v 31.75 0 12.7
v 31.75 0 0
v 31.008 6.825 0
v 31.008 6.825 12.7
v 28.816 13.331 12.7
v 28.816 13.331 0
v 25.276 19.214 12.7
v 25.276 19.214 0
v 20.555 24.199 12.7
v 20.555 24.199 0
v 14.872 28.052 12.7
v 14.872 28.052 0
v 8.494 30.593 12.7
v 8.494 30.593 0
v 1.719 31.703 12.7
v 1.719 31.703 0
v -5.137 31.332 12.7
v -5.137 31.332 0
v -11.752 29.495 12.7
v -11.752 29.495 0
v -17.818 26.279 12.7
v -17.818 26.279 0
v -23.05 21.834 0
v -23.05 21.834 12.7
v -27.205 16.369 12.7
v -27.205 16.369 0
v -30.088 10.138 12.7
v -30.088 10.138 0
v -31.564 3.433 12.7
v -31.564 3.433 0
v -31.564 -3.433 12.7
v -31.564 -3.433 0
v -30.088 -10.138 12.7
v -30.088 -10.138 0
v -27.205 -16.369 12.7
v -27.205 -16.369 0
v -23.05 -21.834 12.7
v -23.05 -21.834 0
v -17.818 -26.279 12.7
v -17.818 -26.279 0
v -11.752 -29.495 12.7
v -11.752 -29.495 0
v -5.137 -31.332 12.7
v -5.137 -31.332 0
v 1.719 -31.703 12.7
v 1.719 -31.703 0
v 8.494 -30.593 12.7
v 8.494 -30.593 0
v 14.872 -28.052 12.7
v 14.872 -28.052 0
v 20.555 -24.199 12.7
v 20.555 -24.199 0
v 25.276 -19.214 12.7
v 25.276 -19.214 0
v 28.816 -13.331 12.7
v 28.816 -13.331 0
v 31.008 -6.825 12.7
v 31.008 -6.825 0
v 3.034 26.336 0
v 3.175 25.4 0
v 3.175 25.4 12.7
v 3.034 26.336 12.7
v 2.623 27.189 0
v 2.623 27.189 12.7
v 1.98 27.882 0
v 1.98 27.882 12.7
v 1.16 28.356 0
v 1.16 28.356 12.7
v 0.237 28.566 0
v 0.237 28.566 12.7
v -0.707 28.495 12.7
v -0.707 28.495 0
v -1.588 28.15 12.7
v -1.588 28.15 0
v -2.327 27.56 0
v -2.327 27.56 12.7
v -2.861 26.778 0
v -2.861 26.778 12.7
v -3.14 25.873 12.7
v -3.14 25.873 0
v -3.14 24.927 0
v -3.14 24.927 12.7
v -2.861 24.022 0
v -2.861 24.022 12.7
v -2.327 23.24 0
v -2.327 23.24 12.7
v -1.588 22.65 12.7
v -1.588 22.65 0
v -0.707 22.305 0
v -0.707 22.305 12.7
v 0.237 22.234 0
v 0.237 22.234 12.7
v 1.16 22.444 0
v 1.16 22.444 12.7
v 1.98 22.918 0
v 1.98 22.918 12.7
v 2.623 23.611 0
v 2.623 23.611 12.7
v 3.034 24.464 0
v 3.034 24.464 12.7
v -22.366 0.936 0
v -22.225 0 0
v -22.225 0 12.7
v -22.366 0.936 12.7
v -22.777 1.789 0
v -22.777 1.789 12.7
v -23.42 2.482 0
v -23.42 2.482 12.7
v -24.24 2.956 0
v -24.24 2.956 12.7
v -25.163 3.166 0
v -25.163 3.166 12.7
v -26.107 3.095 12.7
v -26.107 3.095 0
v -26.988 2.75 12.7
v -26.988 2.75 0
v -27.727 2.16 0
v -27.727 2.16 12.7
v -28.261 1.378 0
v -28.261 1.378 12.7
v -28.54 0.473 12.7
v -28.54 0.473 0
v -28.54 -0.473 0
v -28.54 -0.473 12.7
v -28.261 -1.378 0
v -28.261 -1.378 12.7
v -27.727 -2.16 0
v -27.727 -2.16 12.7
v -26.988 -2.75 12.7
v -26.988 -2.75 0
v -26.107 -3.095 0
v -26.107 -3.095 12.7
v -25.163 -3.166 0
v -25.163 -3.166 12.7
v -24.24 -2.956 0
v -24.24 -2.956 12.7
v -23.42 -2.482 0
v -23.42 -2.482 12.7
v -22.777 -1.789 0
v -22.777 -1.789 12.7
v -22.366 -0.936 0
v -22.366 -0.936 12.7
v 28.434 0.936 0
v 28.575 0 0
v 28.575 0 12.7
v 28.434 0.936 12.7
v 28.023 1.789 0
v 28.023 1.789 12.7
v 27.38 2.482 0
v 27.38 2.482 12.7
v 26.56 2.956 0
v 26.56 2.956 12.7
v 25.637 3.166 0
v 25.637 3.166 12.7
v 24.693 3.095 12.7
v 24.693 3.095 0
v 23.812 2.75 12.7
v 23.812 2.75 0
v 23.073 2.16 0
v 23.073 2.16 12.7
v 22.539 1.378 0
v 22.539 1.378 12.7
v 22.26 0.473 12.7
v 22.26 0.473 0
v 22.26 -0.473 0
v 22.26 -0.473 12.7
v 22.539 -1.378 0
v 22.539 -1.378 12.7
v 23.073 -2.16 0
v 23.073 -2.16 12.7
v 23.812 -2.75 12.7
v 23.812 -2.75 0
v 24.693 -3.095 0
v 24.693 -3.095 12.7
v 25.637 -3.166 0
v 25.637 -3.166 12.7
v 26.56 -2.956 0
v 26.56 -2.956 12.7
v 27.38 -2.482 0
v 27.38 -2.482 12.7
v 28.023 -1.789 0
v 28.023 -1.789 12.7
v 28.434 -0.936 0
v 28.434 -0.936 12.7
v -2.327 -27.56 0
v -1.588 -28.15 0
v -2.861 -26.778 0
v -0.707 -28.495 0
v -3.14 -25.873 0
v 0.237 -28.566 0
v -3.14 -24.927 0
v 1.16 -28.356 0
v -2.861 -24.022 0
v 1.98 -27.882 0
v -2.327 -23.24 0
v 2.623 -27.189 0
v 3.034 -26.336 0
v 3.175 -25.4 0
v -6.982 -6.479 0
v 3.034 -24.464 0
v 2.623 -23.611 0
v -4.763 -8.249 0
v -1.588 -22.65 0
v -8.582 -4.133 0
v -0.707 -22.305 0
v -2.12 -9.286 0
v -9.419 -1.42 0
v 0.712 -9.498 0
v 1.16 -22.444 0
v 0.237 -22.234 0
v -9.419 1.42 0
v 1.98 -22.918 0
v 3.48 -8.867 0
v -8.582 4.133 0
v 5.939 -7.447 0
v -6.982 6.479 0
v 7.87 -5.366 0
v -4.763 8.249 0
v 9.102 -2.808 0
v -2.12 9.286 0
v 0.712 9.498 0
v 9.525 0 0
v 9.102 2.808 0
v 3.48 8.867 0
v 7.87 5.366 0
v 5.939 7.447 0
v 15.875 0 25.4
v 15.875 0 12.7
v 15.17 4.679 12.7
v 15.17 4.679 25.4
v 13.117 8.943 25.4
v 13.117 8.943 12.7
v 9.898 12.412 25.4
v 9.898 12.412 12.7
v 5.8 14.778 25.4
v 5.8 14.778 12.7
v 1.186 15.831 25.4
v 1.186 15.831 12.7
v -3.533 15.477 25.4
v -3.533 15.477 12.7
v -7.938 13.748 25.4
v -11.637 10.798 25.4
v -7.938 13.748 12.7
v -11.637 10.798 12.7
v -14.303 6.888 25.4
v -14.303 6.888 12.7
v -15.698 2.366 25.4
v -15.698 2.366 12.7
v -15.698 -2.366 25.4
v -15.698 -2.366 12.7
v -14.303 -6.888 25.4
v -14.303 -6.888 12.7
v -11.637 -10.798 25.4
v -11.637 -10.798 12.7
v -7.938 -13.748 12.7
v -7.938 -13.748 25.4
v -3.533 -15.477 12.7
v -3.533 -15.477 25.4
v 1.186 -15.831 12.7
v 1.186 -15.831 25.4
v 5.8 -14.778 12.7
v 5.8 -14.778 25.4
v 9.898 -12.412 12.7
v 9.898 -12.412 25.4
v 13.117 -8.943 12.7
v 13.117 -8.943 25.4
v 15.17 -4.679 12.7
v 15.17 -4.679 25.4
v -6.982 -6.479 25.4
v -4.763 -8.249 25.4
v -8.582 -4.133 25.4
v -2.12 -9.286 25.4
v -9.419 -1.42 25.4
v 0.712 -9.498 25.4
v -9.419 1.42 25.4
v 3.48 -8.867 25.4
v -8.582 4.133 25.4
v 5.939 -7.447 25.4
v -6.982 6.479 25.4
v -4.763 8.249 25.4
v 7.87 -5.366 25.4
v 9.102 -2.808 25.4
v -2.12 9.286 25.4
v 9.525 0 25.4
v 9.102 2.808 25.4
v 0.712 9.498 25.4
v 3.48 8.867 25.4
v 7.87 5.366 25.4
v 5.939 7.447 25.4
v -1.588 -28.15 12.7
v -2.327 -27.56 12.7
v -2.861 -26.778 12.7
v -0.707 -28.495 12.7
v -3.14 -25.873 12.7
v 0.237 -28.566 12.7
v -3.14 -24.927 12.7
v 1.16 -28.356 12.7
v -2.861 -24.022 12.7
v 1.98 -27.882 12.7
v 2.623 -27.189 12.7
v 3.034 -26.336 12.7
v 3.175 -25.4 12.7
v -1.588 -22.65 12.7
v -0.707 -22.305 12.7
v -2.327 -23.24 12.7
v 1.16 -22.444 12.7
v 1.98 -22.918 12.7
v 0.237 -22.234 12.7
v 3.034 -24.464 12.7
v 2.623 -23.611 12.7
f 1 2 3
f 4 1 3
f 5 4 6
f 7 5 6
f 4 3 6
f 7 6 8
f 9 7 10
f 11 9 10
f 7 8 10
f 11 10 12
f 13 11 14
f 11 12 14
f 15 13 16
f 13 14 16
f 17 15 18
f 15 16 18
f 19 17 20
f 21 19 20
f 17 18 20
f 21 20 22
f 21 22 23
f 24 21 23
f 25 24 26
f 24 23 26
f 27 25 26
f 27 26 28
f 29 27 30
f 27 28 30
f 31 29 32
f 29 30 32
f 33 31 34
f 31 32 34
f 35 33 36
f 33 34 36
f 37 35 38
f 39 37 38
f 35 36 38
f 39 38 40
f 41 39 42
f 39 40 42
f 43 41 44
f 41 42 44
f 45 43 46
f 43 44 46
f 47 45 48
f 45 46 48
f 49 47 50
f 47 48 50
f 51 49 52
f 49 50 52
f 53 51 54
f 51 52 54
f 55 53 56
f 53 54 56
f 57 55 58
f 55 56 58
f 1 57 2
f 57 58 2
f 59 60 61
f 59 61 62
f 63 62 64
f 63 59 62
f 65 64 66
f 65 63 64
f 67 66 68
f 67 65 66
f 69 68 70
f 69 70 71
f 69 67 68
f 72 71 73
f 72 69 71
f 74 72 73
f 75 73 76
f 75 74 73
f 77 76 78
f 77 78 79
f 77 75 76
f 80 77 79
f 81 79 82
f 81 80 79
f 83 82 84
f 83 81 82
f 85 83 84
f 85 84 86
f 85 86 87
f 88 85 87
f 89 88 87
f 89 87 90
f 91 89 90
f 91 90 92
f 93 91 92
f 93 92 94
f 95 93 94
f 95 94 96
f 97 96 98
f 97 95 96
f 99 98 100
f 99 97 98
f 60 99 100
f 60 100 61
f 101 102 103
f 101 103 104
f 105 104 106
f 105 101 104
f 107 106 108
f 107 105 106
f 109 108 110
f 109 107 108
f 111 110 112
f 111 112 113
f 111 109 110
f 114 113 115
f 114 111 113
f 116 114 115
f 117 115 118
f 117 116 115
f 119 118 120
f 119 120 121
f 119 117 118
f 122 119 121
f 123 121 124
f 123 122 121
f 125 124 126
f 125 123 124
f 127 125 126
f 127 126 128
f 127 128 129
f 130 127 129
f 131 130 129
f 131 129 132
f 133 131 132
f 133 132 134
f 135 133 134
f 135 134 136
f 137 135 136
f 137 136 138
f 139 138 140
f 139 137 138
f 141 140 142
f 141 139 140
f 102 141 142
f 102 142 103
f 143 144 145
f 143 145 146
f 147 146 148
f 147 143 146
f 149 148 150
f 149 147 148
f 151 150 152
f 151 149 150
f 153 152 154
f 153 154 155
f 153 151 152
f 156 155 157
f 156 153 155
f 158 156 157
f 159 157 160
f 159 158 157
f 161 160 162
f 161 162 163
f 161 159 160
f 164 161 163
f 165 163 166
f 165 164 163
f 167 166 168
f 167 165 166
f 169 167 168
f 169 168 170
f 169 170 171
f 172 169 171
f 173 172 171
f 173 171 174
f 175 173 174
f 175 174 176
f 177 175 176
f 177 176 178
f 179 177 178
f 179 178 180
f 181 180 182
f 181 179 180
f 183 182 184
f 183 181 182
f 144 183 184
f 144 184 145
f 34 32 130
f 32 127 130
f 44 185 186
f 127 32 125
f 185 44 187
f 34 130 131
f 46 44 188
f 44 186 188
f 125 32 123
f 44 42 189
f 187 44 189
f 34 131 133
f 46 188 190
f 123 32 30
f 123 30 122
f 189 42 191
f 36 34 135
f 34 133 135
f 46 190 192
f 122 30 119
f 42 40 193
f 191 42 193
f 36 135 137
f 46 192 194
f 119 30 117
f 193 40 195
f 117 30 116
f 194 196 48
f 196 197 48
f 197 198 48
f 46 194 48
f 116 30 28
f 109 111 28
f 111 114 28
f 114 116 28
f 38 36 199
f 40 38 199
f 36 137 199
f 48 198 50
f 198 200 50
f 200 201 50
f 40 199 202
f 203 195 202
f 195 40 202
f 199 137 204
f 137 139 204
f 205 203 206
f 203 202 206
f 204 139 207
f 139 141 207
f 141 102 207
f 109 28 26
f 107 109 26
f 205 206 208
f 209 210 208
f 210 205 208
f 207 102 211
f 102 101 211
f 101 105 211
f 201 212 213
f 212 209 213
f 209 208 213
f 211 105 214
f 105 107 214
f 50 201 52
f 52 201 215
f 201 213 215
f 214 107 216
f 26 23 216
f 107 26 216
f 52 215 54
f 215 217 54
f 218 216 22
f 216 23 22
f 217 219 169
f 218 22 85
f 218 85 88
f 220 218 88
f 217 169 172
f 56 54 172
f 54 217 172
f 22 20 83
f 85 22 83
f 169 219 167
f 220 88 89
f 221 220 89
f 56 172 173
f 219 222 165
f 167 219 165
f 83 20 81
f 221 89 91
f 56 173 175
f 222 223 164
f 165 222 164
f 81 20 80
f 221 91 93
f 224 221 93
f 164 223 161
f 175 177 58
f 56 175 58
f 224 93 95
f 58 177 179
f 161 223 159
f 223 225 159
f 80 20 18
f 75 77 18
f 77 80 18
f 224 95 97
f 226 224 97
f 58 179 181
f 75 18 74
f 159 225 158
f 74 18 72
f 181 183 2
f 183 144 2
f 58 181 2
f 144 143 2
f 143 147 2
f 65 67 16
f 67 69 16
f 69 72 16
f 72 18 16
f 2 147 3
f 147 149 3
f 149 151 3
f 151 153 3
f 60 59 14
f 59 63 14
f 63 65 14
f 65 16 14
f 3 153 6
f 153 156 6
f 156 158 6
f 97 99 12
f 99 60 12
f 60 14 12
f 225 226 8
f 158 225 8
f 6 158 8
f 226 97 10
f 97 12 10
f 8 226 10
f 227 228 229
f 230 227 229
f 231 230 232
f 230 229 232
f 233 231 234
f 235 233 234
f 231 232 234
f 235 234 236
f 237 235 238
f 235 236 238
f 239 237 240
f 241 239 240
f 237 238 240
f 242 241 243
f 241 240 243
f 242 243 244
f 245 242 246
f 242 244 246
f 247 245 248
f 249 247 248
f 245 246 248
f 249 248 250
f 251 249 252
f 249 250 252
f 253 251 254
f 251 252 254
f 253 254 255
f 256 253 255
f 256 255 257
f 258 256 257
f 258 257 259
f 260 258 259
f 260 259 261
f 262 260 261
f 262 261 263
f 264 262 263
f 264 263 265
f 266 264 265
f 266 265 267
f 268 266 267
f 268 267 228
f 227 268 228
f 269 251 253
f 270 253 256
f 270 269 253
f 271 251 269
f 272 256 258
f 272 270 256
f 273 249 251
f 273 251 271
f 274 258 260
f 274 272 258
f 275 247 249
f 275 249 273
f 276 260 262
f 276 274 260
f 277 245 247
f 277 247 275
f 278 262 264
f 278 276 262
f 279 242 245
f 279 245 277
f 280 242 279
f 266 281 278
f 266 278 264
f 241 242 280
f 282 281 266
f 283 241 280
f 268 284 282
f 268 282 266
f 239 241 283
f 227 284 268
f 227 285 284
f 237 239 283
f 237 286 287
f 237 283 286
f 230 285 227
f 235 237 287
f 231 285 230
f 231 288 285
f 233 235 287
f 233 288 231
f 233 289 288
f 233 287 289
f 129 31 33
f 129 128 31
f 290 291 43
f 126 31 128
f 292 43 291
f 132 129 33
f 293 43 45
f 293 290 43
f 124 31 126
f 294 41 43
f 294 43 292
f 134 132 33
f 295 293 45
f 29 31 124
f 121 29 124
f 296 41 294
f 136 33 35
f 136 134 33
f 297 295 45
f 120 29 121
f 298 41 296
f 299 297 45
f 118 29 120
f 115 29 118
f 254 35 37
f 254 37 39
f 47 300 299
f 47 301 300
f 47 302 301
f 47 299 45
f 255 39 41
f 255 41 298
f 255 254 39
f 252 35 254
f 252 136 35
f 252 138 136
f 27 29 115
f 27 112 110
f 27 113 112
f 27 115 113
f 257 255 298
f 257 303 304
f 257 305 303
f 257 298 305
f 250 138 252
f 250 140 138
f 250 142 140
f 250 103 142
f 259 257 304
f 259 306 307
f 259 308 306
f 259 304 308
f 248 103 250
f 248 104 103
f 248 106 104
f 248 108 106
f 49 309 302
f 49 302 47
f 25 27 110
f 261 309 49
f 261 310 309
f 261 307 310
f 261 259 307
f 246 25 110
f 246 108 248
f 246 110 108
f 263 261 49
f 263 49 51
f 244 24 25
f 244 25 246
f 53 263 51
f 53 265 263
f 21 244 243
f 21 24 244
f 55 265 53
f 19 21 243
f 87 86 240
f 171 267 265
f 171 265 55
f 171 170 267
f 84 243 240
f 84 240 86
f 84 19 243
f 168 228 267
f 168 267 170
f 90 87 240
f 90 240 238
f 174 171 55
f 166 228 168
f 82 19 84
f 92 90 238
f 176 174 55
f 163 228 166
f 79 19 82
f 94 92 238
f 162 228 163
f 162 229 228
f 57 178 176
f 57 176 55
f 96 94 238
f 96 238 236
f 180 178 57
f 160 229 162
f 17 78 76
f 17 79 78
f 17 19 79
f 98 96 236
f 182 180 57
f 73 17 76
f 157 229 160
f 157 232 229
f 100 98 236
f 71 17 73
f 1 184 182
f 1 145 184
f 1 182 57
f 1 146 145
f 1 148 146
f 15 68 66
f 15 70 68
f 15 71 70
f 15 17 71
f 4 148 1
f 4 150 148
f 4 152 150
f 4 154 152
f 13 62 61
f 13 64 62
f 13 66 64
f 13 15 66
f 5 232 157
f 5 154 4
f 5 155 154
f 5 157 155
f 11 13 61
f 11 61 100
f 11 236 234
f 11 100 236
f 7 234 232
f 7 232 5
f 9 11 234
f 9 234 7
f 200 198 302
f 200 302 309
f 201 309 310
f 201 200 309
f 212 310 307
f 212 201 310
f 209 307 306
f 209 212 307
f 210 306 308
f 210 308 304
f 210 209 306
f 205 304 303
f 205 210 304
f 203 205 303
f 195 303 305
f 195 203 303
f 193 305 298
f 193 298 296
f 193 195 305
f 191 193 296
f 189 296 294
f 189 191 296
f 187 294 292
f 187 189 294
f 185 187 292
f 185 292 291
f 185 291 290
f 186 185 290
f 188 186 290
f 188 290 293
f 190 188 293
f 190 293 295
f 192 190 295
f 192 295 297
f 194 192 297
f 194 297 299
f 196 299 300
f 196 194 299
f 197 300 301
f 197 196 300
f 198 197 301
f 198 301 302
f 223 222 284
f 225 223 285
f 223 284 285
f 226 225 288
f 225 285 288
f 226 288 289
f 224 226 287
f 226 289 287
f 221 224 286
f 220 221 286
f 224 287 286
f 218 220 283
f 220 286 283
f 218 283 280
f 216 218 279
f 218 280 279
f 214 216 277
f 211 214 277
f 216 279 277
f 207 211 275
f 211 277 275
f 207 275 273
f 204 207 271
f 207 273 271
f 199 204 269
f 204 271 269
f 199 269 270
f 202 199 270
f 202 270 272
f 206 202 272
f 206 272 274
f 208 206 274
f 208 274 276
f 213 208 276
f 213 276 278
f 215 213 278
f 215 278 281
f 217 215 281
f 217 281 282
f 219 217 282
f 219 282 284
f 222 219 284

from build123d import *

# Parameters (mm, degrees)
F0_R     = 31.75
F0_R_2   = 3.175
F0_R_3   = 15.875
F1_DEPTH = 12.7
F2_DEPTH = 25.4
F3_R     = 9.525
F4_DEPTH = 25.401


with BuildPart() as f1:
    # F0 (on Top) → F1 (new body)
    with BuildSketch(Plane.XY):
        Circle(F0_R)
        with Locations((0, -25.4)):
            Circle(F0_R_2, mode=Mode.SUBTRACT)
        with Locations((-25.4, 0)):
            Circle(F0_R_2, mode=Mode.SUBTRACT)
        Circle(F0_R_3, mode=Mode.SUBTRACT)
        with Locations((25.4, 0)):
            Circle(F0_R_2, mode=Mode.SUBTRACT)
        with Locations((0, 25.4)):
            Circle(F0_R_2, mode=Mode.SUBTRACT)
    extrude(amount=F1_DEPTH)

    # F0 (on Top) → F2 (join)
    with BuildSketch(Plane.XY):
        Circle(F0_R_3)
    extrude(amount=F2_DEPTH)

    # F3 (on face) → F4 (cut, through all)
    with BuildSketch(Plane.XY.offset(25.4)):
        Circle(F3_R)
    extrude(amount=-F4_DEPTH, mode=Mode.SUBTRACT)


solid = f1.part
